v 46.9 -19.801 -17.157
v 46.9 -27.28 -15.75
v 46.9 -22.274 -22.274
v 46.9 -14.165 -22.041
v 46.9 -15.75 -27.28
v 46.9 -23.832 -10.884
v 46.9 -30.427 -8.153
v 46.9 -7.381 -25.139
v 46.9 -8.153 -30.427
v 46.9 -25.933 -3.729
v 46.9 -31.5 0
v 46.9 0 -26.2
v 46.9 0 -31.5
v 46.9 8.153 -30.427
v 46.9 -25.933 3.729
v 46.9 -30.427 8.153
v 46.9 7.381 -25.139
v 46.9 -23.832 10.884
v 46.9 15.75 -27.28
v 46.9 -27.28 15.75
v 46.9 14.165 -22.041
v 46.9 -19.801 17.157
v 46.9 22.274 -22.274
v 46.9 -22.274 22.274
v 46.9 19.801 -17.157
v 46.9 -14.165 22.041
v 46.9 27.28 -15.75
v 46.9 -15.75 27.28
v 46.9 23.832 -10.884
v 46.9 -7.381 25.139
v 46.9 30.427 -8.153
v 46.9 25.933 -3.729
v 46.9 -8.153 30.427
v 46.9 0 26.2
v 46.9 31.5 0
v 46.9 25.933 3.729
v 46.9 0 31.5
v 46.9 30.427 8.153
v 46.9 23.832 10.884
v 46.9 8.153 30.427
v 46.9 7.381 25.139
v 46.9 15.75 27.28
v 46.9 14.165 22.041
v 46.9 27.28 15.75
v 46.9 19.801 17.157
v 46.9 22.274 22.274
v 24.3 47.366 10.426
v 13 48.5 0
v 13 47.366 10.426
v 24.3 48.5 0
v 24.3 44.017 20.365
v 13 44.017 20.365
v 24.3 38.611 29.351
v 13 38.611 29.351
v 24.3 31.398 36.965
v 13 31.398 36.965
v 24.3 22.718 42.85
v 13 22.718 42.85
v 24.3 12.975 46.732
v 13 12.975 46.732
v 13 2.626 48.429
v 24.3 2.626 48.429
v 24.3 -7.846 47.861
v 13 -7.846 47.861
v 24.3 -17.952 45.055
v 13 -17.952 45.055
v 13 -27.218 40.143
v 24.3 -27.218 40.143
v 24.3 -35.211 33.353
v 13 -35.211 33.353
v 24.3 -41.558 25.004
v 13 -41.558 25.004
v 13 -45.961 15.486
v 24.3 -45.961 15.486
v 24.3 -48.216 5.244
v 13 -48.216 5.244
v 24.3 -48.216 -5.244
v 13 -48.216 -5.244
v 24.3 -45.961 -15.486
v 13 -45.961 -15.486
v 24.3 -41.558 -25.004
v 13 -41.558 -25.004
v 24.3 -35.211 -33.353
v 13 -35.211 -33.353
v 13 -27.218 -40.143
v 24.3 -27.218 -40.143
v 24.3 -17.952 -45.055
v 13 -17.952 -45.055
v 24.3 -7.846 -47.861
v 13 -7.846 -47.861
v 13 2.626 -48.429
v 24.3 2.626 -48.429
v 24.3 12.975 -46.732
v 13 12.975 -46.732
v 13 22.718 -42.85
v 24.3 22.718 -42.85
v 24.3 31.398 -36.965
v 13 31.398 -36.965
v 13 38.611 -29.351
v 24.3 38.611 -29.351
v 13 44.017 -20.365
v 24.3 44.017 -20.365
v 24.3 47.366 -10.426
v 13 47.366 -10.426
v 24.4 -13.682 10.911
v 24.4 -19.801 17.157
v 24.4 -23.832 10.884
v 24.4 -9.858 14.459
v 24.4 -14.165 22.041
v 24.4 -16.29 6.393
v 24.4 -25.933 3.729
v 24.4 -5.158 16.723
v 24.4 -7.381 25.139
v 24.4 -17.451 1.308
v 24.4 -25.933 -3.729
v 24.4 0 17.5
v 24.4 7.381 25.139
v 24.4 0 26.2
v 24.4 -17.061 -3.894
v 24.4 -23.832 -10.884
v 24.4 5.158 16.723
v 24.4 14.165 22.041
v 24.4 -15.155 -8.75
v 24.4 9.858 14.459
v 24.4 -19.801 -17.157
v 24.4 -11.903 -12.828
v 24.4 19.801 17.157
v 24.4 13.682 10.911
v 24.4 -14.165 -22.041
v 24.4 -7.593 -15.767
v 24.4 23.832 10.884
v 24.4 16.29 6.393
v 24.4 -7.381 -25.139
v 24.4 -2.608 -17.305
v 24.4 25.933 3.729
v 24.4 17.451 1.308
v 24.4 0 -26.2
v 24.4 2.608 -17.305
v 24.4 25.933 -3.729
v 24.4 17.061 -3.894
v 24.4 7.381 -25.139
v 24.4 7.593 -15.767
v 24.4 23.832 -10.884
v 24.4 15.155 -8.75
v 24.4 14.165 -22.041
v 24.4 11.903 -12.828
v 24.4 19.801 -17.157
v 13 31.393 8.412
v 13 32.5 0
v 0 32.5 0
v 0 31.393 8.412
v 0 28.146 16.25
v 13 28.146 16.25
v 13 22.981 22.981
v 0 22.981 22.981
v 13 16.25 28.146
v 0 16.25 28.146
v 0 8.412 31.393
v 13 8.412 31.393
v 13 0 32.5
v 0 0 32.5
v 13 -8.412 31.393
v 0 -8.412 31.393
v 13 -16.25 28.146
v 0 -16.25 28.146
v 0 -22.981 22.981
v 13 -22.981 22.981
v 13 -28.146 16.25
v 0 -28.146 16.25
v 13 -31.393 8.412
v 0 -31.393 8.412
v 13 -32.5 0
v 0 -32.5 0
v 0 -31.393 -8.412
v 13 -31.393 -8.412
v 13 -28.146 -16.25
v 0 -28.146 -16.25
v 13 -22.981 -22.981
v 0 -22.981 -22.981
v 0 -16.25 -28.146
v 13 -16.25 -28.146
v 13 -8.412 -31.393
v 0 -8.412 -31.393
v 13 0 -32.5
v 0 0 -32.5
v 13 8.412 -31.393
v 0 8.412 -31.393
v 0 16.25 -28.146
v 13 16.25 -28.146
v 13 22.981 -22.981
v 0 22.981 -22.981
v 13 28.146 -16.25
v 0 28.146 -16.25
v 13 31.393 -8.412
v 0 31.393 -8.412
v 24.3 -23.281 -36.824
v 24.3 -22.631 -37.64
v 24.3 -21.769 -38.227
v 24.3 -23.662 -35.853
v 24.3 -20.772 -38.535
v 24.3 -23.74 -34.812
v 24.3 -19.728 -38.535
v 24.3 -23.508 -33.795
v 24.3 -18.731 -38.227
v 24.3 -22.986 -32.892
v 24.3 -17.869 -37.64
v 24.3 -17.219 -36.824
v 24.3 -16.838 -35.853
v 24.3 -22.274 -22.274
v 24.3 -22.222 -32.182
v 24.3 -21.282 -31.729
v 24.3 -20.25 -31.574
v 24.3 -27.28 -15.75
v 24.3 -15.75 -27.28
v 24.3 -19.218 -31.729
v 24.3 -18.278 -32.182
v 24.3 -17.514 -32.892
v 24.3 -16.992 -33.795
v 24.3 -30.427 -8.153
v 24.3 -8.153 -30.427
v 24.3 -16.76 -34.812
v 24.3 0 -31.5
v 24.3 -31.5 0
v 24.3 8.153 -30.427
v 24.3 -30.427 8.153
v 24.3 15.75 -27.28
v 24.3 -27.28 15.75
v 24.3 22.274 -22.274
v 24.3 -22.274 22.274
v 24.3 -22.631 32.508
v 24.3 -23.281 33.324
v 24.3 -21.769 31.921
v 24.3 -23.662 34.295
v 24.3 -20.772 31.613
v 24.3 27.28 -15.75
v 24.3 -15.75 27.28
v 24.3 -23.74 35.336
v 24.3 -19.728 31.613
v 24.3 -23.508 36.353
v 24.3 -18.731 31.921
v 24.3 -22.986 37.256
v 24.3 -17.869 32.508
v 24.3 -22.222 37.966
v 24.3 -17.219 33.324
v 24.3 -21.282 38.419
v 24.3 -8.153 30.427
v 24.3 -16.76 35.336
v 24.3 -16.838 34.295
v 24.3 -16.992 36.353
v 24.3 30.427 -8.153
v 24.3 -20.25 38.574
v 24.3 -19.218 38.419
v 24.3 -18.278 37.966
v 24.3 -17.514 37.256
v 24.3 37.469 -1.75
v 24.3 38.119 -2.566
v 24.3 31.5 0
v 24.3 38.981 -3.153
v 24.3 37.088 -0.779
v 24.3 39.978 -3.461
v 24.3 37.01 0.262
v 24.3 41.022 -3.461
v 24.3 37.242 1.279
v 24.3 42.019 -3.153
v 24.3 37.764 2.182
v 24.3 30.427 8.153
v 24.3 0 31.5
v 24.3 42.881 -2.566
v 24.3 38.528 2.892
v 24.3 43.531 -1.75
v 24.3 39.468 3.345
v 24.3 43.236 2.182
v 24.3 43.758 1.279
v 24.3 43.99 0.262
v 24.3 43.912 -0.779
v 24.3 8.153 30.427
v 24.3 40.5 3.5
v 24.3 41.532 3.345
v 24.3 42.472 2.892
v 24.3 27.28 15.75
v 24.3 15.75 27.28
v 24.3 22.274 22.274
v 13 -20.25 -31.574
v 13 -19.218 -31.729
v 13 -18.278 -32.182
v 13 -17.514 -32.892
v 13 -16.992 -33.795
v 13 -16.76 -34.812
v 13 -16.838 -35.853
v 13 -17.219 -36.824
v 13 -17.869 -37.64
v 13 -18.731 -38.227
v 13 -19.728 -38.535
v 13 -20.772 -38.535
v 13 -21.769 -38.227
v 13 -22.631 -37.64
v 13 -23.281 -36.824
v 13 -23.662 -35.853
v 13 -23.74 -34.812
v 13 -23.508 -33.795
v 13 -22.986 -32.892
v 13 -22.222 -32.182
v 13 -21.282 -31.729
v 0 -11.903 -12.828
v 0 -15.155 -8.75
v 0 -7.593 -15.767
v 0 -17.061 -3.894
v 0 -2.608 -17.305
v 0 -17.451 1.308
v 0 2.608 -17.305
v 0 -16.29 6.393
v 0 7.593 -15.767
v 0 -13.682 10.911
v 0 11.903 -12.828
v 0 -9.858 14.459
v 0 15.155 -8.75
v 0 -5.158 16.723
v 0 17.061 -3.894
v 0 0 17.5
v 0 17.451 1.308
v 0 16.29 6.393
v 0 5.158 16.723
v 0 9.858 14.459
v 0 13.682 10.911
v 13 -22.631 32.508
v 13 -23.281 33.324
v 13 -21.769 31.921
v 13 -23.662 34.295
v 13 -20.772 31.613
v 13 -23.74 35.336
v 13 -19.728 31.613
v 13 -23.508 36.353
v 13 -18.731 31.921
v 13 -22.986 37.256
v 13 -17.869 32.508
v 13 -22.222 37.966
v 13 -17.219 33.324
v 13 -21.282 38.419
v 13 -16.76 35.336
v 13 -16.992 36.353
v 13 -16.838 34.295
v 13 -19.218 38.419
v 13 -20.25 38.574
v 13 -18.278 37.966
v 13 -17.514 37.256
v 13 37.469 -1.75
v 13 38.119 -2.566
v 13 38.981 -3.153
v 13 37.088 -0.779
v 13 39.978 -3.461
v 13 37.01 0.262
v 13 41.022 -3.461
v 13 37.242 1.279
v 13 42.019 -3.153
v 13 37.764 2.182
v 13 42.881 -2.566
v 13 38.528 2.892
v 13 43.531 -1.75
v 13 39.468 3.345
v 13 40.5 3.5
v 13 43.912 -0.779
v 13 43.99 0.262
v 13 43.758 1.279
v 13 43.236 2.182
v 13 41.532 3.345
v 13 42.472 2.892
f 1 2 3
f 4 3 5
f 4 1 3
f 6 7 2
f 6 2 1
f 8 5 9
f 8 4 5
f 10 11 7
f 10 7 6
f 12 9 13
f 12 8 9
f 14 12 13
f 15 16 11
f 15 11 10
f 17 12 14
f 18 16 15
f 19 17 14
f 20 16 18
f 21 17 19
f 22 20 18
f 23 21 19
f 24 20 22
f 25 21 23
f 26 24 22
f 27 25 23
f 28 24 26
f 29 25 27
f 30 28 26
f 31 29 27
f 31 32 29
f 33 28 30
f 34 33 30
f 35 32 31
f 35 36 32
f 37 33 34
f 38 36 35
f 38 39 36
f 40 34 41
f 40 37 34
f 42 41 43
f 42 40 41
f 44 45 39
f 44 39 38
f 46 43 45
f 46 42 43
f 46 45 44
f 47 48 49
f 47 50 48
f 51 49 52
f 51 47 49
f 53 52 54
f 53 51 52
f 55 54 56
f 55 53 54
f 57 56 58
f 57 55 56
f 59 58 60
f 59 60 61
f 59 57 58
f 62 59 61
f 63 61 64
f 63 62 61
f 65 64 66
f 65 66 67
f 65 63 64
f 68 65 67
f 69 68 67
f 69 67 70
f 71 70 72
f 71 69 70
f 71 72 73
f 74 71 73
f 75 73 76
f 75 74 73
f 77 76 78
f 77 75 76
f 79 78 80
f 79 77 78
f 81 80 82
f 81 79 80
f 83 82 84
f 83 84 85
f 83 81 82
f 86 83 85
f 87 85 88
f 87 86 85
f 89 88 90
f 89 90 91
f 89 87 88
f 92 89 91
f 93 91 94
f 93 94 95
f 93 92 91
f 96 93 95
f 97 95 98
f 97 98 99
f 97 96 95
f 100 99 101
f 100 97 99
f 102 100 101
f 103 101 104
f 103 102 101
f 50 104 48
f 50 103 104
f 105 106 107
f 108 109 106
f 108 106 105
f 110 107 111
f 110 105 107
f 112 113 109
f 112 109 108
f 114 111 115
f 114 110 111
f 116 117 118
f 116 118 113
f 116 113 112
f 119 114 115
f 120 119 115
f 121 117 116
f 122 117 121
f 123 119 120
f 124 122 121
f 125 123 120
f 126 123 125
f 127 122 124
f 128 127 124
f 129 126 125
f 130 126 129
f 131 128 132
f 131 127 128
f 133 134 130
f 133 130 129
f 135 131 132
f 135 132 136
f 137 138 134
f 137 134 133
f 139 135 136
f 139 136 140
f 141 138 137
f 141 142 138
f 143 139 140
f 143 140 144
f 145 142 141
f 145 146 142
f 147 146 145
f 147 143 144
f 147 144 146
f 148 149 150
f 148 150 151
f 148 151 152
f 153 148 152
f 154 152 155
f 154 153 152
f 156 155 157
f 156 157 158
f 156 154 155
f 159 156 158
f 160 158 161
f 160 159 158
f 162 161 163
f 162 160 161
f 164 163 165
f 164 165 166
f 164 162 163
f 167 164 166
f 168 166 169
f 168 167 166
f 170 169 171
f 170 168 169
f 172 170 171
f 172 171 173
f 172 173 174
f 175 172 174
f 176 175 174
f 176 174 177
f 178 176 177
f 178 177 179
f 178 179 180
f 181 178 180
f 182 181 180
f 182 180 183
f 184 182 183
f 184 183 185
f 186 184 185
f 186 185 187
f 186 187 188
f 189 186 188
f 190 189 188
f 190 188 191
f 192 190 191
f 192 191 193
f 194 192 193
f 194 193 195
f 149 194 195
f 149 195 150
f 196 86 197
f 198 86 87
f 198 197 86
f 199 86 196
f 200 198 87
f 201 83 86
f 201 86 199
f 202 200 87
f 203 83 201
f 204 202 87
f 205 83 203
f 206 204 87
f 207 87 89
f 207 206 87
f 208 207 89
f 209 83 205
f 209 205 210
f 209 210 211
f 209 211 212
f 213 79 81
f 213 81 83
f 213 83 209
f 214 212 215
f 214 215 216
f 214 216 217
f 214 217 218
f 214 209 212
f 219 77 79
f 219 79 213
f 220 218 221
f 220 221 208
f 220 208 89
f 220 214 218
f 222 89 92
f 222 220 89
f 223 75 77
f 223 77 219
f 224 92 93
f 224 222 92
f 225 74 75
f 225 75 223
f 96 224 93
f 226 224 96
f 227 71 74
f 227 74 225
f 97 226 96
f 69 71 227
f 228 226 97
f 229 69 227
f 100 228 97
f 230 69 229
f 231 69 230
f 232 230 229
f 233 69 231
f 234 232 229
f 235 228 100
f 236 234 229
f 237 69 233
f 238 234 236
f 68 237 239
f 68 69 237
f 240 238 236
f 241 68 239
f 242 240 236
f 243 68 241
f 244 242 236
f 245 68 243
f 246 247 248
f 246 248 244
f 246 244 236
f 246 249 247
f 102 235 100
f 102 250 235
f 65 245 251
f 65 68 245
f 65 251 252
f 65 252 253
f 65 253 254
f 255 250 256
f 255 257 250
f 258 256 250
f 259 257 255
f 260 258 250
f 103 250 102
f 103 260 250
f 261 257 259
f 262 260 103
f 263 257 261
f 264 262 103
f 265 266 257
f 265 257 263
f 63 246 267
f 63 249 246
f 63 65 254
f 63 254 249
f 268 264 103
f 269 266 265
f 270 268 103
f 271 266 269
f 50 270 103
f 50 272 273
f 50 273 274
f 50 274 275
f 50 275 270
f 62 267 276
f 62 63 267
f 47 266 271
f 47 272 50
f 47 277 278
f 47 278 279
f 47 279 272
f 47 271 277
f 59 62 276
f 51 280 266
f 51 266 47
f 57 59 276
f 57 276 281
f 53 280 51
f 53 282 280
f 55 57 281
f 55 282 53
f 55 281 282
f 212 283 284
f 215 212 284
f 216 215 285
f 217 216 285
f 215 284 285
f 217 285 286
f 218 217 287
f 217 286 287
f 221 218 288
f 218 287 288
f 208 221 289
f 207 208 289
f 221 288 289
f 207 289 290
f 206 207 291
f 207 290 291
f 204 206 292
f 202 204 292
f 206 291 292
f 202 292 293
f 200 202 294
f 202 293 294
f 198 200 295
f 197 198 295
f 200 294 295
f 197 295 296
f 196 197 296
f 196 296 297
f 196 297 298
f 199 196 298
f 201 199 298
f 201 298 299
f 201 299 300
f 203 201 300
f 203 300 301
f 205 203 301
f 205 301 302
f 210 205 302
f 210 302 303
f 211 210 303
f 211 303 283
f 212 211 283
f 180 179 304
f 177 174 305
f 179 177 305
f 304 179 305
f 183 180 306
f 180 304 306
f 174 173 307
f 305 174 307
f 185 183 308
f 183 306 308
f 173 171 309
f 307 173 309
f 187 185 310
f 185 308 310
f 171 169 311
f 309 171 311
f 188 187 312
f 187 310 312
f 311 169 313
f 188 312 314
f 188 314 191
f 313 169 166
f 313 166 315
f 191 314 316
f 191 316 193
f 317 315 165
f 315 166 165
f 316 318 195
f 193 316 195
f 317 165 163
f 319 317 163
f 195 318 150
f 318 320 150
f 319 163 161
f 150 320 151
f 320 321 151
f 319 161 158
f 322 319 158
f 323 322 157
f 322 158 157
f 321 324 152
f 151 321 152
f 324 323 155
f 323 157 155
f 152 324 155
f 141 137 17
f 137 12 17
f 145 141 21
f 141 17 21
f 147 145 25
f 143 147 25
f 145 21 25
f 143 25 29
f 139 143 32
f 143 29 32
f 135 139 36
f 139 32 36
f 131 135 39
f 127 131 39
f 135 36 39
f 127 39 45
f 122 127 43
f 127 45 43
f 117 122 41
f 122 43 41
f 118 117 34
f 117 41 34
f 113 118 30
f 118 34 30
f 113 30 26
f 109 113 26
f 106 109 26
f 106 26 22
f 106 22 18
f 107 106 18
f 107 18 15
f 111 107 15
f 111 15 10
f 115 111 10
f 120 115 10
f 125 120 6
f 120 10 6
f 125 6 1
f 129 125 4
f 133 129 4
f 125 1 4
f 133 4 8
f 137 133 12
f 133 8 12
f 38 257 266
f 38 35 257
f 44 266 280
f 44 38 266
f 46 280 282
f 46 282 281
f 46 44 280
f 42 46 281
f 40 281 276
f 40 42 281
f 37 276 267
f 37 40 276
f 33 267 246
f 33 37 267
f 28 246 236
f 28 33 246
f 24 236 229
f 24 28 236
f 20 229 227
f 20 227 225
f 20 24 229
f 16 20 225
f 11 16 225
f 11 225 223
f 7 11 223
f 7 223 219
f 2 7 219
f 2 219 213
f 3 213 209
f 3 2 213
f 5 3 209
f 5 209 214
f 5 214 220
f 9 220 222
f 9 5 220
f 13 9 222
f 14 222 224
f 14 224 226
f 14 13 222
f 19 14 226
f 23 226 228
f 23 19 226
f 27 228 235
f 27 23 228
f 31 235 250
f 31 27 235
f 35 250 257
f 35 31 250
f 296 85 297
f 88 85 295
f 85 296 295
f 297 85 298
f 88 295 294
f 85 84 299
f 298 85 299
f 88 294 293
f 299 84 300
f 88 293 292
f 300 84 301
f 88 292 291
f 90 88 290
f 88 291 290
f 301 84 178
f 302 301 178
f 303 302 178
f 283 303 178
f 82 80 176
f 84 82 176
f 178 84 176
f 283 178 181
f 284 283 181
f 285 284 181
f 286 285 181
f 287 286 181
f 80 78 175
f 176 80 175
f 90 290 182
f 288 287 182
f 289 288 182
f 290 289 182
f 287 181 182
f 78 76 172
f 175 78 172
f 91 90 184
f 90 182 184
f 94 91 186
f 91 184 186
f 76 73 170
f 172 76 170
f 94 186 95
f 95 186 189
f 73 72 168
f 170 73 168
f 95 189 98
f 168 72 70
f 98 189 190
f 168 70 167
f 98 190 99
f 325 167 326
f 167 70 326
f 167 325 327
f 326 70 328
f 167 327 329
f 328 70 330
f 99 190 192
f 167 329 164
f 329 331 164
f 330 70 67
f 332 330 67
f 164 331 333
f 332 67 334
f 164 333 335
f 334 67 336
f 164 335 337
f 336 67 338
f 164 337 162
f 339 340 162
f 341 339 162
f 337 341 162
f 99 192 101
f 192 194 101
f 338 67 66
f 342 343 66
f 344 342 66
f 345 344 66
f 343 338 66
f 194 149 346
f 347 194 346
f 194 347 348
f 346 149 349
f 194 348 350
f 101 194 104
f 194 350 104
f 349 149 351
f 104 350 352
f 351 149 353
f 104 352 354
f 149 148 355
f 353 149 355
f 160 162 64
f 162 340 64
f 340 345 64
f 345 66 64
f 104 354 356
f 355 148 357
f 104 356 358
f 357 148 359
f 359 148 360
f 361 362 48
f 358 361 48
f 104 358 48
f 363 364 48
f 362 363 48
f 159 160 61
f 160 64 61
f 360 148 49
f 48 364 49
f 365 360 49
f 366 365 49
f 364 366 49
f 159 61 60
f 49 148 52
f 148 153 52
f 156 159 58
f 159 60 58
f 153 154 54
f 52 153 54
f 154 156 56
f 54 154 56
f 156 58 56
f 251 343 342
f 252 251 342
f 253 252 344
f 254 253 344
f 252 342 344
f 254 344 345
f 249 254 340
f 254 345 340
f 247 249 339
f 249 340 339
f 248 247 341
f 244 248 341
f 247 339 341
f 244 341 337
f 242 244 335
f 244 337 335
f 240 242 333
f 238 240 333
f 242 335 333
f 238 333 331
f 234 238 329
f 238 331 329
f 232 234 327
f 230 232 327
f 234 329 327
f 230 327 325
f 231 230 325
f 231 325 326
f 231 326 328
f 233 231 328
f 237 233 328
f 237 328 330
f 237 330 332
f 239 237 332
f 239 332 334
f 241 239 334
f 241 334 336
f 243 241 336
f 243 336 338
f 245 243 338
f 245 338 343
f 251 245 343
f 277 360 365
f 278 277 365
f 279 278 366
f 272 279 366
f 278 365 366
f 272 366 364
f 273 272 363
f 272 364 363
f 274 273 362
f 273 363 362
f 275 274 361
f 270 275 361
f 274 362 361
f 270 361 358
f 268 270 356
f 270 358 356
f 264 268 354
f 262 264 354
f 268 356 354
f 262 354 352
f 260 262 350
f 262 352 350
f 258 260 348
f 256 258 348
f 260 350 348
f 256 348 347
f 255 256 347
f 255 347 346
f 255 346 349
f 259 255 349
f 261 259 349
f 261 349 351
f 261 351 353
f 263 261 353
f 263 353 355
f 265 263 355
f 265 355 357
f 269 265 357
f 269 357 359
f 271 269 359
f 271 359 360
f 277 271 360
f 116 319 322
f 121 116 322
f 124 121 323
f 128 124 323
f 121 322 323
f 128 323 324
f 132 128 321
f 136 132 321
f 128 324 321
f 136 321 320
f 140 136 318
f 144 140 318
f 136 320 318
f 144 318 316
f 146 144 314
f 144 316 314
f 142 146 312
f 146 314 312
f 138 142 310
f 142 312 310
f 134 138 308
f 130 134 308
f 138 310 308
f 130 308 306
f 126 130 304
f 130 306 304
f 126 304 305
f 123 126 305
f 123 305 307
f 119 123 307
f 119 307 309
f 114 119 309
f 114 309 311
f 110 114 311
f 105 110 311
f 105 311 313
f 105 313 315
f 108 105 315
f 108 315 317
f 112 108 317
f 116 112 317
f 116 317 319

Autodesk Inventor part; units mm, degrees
ref_plane "YZ Plane" through (0, 0, 0) normal (1, 0, 0) x (0, 1, 0)
ref_plane "XZ Plane" through (0, 0, 0) normal (0, 1, 0) x (-1, 0, 0)
ref_plane "XY Plane" through (0, 0, 0) normal (0, 0, 1) x (1, 0, 0)
sketch "Sketch1" plane through (0, 0, 0) normal (0, 0, 1) x (1, 0, 0)
  line L0 (0, 0) -> (0, 32.5)
  line L1 (0, 32.5) -> (13, 32.5)
  line L2 (13, 32.5) -> (13, 48.5)
  line L3 (13, 48.5) -> (24.3, 48.5)
  line L4 (24.3, 48.5) -> (24.3, 31.5)
  line L5 (24.3, 31.5) -> (46.9, 31.5)
  line L6 (46.9, 31.5) -> (46.9, 0)
  line L7 (0, 0) -> (46.9, 0)
  dimension "d0" = 32.5
  dimension "d1" = 13
  dimension "d2" = 16
  dimension "d3" = 11.3
  dimension "d4" = 17
  dimension "d5" = 22.6
revolve "Revolution1" add sketch "Sketch1" angle 360 about axis through (0, 0, 0) along (1, 0, 0)
sketch "Sketch2" plane through (13, 0, 0) normal (-1, 0, 0) x (0, 0, 1)
  circle A0 centre (0, 0) radius 32.5 projected
  circle A1 centre (0, 0) radius 48.5 projected
  circle A2 centre (0, 40.5) radius 3.5
  circle A3 centre (35.074, -20.25) radius 3.5
  circle A4 centre (-35.074, -20.25) radius 3.5
  dimension "d11" = 7
  dimension "d12" = 7
  dimension "d13" = 7
extrude "Extrusion1" cut sketch "Sketch2" against normal through all contours A2 | A3 | A4
sketch "Sketch3" plane through (0, 0, 0) normal (-1, 0, 0) x (0, 0, 1)
  circle A0 centre (0, 0) radius 17.5
  dimension "d16" = 35
sketch "Sketch4" plane through (0, 0, 0) normal (-1, 0, 0) x (0, 0, 1)
  point P0 (0, 0)
extrude "Extrusion2" cut sketch "Sketch3" against normal through all
sketch "Sketch5" plane through (46.9, 0, 0) normal (1, 0, 0) x (0, 0, -1)
  circle A0 centre (0, 0) radius 31.5 projected
  circle A1 centre (0, 0) radius 26.2
extrude "Extrusion3" cut sketch "Sketch5" against normal blind 22.5 contours A1
properties part number "capa da engrenagem"
